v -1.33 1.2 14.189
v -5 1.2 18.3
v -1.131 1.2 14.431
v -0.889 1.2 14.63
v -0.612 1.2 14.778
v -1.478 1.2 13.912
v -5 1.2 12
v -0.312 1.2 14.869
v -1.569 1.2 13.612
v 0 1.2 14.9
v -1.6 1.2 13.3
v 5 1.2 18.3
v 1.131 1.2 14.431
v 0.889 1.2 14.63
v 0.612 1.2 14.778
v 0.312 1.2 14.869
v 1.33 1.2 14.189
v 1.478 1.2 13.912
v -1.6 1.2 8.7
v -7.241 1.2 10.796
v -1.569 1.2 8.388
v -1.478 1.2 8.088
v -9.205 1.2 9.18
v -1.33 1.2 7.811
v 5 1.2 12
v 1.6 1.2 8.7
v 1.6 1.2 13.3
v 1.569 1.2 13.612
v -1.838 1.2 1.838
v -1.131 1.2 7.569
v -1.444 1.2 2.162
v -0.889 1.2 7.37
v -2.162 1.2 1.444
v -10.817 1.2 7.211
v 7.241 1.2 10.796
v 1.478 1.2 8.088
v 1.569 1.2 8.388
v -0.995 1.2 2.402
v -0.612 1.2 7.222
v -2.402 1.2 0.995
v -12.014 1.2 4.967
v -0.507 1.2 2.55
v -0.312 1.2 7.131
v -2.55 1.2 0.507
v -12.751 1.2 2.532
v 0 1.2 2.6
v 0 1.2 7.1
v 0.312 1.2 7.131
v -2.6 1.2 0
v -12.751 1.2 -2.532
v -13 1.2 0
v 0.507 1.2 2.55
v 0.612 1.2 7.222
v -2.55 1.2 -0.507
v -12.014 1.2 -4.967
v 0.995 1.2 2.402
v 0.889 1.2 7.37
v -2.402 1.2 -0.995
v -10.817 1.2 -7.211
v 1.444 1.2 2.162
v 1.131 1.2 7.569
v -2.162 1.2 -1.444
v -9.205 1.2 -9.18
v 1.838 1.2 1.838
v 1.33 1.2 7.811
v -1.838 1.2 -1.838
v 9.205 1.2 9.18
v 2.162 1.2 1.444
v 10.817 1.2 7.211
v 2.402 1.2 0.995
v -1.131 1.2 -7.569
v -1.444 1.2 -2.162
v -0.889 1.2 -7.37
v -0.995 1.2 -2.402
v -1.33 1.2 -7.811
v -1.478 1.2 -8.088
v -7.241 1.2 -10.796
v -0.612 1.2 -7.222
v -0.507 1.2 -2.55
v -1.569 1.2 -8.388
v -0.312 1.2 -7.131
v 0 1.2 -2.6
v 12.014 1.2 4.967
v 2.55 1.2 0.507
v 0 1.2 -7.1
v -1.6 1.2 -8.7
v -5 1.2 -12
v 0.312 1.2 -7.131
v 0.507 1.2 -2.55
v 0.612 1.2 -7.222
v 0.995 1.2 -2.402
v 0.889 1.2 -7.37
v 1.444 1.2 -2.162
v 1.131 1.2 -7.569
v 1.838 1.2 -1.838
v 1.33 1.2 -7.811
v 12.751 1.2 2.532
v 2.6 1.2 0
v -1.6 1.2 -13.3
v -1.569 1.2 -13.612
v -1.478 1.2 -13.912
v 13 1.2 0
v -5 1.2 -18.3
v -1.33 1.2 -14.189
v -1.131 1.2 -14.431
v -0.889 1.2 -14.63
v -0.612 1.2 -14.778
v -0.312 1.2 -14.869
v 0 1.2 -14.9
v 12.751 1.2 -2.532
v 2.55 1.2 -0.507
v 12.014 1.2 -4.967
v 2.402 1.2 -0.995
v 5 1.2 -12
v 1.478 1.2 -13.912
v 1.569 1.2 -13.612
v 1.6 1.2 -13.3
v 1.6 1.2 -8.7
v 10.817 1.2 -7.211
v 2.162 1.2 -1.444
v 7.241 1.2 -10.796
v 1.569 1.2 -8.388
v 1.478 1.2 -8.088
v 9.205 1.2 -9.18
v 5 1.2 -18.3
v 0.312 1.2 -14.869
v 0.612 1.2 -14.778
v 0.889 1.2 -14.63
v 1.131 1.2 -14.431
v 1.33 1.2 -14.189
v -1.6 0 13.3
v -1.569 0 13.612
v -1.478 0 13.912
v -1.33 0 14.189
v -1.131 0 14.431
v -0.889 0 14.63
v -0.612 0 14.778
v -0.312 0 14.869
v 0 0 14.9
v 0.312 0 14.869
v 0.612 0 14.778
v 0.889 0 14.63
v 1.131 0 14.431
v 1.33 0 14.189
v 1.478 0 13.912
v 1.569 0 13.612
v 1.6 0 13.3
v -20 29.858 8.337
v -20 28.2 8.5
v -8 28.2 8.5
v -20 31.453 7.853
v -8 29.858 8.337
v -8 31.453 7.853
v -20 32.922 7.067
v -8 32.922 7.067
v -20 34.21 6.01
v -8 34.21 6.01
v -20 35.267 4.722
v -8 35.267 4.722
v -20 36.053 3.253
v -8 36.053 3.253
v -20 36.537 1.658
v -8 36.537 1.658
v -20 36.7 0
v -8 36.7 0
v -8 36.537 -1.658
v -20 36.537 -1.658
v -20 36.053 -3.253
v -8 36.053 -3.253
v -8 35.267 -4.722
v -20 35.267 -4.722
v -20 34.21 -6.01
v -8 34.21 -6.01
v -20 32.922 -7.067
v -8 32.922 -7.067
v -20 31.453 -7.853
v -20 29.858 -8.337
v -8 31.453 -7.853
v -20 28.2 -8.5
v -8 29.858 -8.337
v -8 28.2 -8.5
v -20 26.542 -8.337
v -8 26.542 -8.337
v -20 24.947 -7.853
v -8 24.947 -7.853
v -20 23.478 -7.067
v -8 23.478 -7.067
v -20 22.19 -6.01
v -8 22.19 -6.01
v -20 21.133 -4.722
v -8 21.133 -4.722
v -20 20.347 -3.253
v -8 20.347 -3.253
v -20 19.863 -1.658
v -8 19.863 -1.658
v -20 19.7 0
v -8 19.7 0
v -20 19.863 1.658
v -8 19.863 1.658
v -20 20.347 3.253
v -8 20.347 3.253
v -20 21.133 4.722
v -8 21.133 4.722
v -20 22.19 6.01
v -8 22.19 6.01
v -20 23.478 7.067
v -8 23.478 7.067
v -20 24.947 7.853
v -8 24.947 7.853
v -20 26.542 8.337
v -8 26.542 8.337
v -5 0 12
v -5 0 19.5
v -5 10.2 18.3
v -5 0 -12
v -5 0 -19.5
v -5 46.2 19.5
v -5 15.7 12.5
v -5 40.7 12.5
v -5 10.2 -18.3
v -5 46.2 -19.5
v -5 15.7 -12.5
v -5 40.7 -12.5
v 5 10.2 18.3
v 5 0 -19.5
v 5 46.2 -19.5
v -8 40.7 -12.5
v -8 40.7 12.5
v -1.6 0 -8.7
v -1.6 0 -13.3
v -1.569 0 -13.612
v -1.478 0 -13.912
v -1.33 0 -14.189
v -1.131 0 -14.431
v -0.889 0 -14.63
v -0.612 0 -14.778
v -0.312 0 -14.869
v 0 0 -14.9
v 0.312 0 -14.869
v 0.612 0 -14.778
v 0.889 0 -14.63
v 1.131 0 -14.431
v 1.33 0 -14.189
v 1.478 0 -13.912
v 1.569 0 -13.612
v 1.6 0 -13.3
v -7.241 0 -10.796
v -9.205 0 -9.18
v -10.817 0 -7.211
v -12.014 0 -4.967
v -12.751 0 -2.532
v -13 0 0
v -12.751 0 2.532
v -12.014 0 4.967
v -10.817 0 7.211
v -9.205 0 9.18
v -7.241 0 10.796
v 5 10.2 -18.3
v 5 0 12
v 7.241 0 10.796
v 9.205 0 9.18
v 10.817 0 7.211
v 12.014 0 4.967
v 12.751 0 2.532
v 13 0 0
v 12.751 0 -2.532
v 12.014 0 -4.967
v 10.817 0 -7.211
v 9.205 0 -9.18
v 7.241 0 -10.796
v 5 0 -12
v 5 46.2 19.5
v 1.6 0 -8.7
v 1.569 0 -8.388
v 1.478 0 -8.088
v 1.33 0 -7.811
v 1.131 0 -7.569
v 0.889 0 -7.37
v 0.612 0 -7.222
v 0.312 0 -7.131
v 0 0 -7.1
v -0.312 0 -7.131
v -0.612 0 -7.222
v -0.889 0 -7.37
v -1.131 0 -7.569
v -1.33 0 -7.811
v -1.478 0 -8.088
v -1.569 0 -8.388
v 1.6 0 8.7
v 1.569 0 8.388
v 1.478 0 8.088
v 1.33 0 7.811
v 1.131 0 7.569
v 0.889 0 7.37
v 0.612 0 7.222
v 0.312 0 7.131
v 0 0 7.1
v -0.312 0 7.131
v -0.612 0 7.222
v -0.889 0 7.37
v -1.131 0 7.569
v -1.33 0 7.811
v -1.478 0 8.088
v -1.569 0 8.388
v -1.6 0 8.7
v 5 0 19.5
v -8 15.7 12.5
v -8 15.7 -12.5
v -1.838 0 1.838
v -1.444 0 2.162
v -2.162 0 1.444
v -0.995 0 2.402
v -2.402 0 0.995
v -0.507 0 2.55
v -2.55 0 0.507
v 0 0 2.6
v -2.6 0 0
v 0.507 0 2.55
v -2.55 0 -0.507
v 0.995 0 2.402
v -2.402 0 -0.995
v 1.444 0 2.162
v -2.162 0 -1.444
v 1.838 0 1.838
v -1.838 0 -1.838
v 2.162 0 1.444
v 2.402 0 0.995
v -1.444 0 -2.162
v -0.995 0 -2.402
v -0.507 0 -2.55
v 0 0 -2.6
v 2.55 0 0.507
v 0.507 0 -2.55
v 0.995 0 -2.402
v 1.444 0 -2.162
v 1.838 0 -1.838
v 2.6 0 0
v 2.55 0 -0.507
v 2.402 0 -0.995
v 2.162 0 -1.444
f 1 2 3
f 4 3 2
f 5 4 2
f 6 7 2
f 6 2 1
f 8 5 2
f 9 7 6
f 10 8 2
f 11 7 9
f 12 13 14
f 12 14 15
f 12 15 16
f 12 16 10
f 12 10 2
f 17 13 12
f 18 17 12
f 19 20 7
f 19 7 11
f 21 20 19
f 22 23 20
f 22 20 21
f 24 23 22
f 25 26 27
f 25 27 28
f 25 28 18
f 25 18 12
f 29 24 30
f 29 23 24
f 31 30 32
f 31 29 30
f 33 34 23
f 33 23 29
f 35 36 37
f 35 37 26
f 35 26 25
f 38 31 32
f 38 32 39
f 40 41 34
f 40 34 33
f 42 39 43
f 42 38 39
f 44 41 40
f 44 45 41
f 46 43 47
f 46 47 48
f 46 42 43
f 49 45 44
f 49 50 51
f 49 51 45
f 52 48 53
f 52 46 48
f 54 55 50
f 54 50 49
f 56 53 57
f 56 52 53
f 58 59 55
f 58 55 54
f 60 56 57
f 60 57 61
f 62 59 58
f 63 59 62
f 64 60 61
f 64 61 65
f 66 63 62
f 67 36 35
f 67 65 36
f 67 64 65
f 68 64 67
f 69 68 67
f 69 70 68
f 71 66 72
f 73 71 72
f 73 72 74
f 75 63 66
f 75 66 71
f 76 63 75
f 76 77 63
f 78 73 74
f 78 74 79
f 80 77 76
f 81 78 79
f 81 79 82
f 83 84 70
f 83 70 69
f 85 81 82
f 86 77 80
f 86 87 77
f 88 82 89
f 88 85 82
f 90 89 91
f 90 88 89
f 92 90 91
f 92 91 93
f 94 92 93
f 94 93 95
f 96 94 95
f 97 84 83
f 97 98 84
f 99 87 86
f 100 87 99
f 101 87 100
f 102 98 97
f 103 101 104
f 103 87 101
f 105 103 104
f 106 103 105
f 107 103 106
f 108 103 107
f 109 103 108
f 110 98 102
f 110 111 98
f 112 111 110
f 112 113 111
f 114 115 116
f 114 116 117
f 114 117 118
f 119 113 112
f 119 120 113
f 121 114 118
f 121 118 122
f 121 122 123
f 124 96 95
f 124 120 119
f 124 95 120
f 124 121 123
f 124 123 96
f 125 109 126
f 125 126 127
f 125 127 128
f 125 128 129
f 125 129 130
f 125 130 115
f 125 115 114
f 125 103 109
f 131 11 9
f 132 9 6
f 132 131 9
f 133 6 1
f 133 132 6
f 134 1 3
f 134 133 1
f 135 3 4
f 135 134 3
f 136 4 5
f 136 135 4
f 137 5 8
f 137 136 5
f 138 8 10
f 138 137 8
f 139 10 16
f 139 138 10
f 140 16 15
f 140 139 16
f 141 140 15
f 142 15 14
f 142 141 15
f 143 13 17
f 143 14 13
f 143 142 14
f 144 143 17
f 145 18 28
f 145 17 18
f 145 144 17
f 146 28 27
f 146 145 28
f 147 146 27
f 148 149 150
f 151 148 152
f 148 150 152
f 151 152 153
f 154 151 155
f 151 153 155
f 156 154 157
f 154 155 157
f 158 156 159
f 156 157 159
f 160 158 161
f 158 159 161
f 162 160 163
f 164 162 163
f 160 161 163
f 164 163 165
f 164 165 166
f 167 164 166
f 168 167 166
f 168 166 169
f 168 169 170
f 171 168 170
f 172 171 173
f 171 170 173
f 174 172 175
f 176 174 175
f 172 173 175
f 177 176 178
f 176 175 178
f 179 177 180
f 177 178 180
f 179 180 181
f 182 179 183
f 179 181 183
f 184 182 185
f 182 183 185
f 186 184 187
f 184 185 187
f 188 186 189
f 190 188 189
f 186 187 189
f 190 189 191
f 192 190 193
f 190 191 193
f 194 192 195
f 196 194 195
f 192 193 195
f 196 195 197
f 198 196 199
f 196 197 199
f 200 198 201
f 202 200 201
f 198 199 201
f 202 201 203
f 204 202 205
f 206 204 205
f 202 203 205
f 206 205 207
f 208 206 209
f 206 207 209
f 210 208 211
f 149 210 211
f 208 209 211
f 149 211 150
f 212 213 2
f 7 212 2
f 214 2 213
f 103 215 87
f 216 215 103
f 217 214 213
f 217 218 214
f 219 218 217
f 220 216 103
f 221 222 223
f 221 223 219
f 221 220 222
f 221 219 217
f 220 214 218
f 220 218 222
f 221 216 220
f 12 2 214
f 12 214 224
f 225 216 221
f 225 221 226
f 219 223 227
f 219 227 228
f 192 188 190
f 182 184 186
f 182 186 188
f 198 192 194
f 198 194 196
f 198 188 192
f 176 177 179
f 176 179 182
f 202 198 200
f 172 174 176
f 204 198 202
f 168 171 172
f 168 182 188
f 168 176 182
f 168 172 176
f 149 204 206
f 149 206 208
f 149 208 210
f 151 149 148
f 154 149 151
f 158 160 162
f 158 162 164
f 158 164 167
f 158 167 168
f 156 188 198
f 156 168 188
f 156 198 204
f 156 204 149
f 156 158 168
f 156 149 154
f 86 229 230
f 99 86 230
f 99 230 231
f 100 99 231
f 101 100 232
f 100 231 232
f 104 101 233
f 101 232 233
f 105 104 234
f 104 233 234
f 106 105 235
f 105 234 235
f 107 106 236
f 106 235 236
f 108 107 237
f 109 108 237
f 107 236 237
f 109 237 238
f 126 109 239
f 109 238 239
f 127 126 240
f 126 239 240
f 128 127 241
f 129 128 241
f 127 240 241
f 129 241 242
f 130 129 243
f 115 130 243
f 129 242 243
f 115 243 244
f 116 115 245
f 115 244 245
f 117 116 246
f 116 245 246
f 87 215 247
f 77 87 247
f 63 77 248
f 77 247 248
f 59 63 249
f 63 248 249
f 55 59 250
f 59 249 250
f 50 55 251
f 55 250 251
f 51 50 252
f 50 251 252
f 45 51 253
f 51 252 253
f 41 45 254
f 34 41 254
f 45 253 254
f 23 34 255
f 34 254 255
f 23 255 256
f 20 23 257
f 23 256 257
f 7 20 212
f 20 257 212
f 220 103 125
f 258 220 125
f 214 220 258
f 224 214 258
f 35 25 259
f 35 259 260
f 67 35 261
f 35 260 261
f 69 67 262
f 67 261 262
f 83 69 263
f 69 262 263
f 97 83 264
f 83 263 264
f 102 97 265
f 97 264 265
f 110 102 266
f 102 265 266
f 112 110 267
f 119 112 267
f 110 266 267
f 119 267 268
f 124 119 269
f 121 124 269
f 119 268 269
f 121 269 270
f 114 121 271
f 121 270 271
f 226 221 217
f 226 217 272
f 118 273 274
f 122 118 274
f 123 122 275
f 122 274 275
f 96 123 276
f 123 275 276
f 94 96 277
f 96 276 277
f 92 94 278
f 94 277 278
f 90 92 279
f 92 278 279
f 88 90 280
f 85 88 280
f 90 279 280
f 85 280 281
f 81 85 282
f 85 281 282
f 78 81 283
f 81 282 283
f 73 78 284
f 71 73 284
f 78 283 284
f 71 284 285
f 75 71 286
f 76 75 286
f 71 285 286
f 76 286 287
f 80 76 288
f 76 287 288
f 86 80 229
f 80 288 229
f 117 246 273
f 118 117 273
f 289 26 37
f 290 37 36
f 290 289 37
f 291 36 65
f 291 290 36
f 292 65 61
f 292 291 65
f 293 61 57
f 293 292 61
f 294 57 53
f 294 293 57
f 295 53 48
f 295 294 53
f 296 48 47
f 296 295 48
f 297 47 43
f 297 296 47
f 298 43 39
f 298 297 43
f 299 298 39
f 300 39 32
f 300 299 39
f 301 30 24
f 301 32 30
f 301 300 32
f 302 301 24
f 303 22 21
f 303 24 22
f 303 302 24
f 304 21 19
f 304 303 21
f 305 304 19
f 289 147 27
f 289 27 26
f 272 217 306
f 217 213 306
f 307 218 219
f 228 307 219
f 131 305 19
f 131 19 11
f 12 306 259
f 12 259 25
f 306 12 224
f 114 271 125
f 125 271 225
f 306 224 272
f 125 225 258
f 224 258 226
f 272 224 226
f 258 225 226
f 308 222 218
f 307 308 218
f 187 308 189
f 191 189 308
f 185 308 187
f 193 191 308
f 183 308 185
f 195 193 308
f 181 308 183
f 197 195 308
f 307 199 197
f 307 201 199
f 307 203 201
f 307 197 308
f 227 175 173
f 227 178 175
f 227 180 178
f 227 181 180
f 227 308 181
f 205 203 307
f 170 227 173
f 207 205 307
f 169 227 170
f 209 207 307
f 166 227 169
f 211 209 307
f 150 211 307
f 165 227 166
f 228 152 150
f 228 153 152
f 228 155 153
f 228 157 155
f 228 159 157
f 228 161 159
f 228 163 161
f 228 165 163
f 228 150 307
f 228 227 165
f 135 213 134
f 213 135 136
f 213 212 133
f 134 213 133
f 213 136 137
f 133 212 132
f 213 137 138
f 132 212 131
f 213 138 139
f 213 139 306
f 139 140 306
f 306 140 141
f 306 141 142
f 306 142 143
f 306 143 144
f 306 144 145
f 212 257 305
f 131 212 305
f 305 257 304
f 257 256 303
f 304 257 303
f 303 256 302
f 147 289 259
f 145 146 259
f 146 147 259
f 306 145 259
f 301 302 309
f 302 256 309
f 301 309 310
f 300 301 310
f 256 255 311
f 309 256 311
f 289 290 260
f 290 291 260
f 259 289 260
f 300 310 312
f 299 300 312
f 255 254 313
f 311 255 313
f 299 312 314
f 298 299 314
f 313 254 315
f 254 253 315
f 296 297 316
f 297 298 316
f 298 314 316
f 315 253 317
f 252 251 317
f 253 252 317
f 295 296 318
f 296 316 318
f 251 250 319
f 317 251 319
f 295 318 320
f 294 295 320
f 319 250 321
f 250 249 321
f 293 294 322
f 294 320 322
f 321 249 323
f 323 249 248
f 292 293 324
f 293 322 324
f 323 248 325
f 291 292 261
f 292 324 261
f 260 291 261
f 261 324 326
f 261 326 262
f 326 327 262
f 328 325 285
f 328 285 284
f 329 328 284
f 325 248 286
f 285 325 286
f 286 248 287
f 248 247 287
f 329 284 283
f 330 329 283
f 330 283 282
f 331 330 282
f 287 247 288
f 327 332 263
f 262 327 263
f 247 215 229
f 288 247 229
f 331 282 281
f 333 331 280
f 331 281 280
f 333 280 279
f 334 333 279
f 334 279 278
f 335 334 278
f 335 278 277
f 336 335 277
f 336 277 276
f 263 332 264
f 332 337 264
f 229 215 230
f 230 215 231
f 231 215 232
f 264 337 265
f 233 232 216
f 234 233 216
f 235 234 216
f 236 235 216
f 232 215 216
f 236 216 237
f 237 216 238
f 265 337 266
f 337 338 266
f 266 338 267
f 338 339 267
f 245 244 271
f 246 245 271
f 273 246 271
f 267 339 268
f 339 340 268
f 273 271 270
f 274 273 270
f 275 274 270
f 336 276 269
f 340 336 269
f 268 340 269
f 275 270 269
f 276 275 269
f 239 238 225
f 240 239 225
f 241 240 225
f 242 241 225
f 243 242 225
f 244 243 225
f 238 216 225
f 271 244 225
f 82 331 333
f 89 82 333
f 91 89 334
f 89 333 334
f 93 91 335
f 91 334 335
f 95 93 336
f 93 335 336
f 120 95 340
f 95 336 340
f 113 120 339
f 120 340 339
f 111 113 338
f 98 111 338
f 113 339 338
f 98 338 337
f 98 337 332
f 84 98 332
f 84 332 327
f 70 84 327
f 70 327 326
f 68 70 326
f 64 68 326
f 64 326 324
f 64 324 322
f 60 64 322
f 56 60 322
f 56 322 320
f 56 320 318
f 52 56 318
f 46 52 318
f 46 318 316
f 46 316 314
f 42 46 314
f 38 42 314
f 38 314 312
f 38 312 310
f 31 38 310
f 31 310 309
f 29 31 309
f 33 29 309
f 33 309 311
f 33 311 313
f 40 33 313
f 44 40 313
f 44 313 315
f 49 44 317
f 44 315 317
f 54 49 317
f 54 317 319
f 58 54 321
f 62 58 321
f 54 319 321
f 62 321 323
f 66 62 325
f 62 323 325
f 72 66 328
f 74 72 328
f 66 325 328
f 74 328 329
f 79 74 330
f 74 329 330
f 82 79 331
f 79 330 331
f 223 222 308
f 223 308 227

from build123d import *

# Parameters (mm, degrees)
SKETCH_1_R          = 13
EXTRUDE_1_DEPTH     = 1.2
SKETCH_2_W          = 10
SKETCH_2_H          = 39
EXTRUDE_2_DEPTH     = 1.2
SKETCH_3_W          = 10
SKETCH_3_H          = 1.2
EXTRUDE_3_DEPTH     = 45
SKETCH_4_W          = 10
SKETCH_4_H          = 36
EXTRUDE_4_DEPTH     = 36.6
SKETCH_5_W          = 25
SKETCH_5_H          = 25
EXTRUDE_5_DEPTH     = 3
SKETCH_6_R          = 8.5
EXTRUDE_6_DEPTH     = 12
CUT_EXTRUDE_1_REACH = 55.988
SKETCH_7_R          = 2.6


with BuildPart() as part:
    # 草图1 → 凸台-拉伸1 (new body)
    with BuildSketch(Plane(origin=(0, 0, 0), x_dir=(1, 0, 0), z_dir=(0, 1, 0))):
        with Locations(Location((0, 0, 0), (0, 0, 270))):
            Circle(SKETCH_1_R)
    extrude(amount=EXTRUDE_1_DEPTH)

    # 草图2 → 凸台-拉伸2 (add)
    with BuildSketch(Plane(origin=(0, 1.2, 0), x_dir=(1, 0, 0), z_dir=(0, 1, 0))):
        Rectangle(SKETCH_2_W, SKETCH_2_H)
    extrude(amount=-EXTRUDE_2_DEPTH)

    # 草图3 → 凸台-拉伸3 (add)
    with BuildSketch(Plane(origin=(0, 1.2, 0), x_dir=(1, 0, 0), z_dir=(0, 1, 0))):
        with Locations((0, 18.9)):
            Rectangle(SKETCH_3_W, SKETCH_3_H)
    extrude_3 = extrude(amount=EXTRUDE_3_DEPTH)

    # 镜向1: 凸台-拉伸3 across plane
    add(extrude_3.mirror(Plane.XY))

    # 草图4 → 凸台-拉伸4 (add)
    with BuildSketch(Plane.XY.offset(-18.3)):
        with Locations((0, 28.2)):
            Rectangle(SKETCH_4_W, SKETCH_4_H)
    extrude(amount=EXTRUDE_4_DEPTH)

    # 草图5 → 凸台-拉伸5 (add)
    with BuildSketch(Plane.ZY.offset(5)):
        with Locations((0, 28.2)):
            Rectangle(SKETCH_5_W, SKETCH_5_H)
    extrude(amount=EXTRUDE_5_DEPTH)

    # 草图6 → 凸台-拉伸6 (add)
    with BuildSketch(Plane.ZY.offset(8)):
        with Locations((0, 28.2)):
            Circle(SKETCH_6_R)
    extrude(amount=EXTRUDE_6_DEPTH)

    # 草图7 → 切除-拉伸1 (cut, up to next)
    with BuildSketch(Plane.XZ, mode=Mode.PRIVATE) as cut_extrude_1_sk1:
        with Locations(Location((0, 0, 0), (0, 0, 270))):
            Circle(SKETCH_7_R)
    cut_extrude_1_tool1 = extrude(cut_extrude_1_sk1.sketch, amount=-CUT_EXTRUDE_1_REACH, mode=Mode.PRIVATE) & part.part
    # 草图7 → 切除-拉伸1 (cut, up to next)
    with BuildSketch(Plane.XZ, mode=Mode.PRIVATE) as cut_extrude_1_sk2:
        with BuildLine():
            Line((-1.6, 8.7), (-1.6, 13.3))
            ThreePointArc((-1.6, 13.3), (0, 14.9), (1.6, 13.3))
            Line((1.6, 13.3), (1.6, 8.7))
            ThreePointArc((1.6, 8.7), (0, 7.1), (-1.6, 8.7))
        make_face()
    cut_extrude_1_tool2 = extrude(cut_extrude_1_sk2.sketch, amount=-CUT_EXTRUDE_1_REACH, mode=Mode.PRIVATE) & part.part
    # 草图7 → 切除-拉伸1 (cut, up to next)
    with BuildSketch(Plane.XZ, mode=Mode.PRIVATE) as cut_extrude_1_sk3:
        with BuildLine():
            Line((-1.6, -8.7), (-1.6, -13.3))
            ThreePointArc((-1.6, -13.3), (0, -14.9), (1.6, -13.3))
            Line((1.6, -13.3), (1.6, -8.7))
            ThreePointArc((1.6, -8.7), (0, -7.1), (-1.6, -8.7))
        make_face()
    cut_extrude_1_tool3 = extrude(cut_extrude_1_sk3.sketch, amount=-CUT_EXTRUDE_1_REACH, mode=Mode.PRIVATE) & part.part
    add(cut_extrude_1_tool1.solids().sort_by_distance((0, 0, 0))[0], mode=Mode.SUBTRACT)
    add(cut_extrude_1_tool2.solids().sort_by_distance((0, 0, 11))[0], mode=Mode.SUBTRACT)
    add(cut_extrude_1_tool3.solids().sort_by_distance((0, 0, -11))[0], mode=Mode.SUBTRACT)


solid = part.part
